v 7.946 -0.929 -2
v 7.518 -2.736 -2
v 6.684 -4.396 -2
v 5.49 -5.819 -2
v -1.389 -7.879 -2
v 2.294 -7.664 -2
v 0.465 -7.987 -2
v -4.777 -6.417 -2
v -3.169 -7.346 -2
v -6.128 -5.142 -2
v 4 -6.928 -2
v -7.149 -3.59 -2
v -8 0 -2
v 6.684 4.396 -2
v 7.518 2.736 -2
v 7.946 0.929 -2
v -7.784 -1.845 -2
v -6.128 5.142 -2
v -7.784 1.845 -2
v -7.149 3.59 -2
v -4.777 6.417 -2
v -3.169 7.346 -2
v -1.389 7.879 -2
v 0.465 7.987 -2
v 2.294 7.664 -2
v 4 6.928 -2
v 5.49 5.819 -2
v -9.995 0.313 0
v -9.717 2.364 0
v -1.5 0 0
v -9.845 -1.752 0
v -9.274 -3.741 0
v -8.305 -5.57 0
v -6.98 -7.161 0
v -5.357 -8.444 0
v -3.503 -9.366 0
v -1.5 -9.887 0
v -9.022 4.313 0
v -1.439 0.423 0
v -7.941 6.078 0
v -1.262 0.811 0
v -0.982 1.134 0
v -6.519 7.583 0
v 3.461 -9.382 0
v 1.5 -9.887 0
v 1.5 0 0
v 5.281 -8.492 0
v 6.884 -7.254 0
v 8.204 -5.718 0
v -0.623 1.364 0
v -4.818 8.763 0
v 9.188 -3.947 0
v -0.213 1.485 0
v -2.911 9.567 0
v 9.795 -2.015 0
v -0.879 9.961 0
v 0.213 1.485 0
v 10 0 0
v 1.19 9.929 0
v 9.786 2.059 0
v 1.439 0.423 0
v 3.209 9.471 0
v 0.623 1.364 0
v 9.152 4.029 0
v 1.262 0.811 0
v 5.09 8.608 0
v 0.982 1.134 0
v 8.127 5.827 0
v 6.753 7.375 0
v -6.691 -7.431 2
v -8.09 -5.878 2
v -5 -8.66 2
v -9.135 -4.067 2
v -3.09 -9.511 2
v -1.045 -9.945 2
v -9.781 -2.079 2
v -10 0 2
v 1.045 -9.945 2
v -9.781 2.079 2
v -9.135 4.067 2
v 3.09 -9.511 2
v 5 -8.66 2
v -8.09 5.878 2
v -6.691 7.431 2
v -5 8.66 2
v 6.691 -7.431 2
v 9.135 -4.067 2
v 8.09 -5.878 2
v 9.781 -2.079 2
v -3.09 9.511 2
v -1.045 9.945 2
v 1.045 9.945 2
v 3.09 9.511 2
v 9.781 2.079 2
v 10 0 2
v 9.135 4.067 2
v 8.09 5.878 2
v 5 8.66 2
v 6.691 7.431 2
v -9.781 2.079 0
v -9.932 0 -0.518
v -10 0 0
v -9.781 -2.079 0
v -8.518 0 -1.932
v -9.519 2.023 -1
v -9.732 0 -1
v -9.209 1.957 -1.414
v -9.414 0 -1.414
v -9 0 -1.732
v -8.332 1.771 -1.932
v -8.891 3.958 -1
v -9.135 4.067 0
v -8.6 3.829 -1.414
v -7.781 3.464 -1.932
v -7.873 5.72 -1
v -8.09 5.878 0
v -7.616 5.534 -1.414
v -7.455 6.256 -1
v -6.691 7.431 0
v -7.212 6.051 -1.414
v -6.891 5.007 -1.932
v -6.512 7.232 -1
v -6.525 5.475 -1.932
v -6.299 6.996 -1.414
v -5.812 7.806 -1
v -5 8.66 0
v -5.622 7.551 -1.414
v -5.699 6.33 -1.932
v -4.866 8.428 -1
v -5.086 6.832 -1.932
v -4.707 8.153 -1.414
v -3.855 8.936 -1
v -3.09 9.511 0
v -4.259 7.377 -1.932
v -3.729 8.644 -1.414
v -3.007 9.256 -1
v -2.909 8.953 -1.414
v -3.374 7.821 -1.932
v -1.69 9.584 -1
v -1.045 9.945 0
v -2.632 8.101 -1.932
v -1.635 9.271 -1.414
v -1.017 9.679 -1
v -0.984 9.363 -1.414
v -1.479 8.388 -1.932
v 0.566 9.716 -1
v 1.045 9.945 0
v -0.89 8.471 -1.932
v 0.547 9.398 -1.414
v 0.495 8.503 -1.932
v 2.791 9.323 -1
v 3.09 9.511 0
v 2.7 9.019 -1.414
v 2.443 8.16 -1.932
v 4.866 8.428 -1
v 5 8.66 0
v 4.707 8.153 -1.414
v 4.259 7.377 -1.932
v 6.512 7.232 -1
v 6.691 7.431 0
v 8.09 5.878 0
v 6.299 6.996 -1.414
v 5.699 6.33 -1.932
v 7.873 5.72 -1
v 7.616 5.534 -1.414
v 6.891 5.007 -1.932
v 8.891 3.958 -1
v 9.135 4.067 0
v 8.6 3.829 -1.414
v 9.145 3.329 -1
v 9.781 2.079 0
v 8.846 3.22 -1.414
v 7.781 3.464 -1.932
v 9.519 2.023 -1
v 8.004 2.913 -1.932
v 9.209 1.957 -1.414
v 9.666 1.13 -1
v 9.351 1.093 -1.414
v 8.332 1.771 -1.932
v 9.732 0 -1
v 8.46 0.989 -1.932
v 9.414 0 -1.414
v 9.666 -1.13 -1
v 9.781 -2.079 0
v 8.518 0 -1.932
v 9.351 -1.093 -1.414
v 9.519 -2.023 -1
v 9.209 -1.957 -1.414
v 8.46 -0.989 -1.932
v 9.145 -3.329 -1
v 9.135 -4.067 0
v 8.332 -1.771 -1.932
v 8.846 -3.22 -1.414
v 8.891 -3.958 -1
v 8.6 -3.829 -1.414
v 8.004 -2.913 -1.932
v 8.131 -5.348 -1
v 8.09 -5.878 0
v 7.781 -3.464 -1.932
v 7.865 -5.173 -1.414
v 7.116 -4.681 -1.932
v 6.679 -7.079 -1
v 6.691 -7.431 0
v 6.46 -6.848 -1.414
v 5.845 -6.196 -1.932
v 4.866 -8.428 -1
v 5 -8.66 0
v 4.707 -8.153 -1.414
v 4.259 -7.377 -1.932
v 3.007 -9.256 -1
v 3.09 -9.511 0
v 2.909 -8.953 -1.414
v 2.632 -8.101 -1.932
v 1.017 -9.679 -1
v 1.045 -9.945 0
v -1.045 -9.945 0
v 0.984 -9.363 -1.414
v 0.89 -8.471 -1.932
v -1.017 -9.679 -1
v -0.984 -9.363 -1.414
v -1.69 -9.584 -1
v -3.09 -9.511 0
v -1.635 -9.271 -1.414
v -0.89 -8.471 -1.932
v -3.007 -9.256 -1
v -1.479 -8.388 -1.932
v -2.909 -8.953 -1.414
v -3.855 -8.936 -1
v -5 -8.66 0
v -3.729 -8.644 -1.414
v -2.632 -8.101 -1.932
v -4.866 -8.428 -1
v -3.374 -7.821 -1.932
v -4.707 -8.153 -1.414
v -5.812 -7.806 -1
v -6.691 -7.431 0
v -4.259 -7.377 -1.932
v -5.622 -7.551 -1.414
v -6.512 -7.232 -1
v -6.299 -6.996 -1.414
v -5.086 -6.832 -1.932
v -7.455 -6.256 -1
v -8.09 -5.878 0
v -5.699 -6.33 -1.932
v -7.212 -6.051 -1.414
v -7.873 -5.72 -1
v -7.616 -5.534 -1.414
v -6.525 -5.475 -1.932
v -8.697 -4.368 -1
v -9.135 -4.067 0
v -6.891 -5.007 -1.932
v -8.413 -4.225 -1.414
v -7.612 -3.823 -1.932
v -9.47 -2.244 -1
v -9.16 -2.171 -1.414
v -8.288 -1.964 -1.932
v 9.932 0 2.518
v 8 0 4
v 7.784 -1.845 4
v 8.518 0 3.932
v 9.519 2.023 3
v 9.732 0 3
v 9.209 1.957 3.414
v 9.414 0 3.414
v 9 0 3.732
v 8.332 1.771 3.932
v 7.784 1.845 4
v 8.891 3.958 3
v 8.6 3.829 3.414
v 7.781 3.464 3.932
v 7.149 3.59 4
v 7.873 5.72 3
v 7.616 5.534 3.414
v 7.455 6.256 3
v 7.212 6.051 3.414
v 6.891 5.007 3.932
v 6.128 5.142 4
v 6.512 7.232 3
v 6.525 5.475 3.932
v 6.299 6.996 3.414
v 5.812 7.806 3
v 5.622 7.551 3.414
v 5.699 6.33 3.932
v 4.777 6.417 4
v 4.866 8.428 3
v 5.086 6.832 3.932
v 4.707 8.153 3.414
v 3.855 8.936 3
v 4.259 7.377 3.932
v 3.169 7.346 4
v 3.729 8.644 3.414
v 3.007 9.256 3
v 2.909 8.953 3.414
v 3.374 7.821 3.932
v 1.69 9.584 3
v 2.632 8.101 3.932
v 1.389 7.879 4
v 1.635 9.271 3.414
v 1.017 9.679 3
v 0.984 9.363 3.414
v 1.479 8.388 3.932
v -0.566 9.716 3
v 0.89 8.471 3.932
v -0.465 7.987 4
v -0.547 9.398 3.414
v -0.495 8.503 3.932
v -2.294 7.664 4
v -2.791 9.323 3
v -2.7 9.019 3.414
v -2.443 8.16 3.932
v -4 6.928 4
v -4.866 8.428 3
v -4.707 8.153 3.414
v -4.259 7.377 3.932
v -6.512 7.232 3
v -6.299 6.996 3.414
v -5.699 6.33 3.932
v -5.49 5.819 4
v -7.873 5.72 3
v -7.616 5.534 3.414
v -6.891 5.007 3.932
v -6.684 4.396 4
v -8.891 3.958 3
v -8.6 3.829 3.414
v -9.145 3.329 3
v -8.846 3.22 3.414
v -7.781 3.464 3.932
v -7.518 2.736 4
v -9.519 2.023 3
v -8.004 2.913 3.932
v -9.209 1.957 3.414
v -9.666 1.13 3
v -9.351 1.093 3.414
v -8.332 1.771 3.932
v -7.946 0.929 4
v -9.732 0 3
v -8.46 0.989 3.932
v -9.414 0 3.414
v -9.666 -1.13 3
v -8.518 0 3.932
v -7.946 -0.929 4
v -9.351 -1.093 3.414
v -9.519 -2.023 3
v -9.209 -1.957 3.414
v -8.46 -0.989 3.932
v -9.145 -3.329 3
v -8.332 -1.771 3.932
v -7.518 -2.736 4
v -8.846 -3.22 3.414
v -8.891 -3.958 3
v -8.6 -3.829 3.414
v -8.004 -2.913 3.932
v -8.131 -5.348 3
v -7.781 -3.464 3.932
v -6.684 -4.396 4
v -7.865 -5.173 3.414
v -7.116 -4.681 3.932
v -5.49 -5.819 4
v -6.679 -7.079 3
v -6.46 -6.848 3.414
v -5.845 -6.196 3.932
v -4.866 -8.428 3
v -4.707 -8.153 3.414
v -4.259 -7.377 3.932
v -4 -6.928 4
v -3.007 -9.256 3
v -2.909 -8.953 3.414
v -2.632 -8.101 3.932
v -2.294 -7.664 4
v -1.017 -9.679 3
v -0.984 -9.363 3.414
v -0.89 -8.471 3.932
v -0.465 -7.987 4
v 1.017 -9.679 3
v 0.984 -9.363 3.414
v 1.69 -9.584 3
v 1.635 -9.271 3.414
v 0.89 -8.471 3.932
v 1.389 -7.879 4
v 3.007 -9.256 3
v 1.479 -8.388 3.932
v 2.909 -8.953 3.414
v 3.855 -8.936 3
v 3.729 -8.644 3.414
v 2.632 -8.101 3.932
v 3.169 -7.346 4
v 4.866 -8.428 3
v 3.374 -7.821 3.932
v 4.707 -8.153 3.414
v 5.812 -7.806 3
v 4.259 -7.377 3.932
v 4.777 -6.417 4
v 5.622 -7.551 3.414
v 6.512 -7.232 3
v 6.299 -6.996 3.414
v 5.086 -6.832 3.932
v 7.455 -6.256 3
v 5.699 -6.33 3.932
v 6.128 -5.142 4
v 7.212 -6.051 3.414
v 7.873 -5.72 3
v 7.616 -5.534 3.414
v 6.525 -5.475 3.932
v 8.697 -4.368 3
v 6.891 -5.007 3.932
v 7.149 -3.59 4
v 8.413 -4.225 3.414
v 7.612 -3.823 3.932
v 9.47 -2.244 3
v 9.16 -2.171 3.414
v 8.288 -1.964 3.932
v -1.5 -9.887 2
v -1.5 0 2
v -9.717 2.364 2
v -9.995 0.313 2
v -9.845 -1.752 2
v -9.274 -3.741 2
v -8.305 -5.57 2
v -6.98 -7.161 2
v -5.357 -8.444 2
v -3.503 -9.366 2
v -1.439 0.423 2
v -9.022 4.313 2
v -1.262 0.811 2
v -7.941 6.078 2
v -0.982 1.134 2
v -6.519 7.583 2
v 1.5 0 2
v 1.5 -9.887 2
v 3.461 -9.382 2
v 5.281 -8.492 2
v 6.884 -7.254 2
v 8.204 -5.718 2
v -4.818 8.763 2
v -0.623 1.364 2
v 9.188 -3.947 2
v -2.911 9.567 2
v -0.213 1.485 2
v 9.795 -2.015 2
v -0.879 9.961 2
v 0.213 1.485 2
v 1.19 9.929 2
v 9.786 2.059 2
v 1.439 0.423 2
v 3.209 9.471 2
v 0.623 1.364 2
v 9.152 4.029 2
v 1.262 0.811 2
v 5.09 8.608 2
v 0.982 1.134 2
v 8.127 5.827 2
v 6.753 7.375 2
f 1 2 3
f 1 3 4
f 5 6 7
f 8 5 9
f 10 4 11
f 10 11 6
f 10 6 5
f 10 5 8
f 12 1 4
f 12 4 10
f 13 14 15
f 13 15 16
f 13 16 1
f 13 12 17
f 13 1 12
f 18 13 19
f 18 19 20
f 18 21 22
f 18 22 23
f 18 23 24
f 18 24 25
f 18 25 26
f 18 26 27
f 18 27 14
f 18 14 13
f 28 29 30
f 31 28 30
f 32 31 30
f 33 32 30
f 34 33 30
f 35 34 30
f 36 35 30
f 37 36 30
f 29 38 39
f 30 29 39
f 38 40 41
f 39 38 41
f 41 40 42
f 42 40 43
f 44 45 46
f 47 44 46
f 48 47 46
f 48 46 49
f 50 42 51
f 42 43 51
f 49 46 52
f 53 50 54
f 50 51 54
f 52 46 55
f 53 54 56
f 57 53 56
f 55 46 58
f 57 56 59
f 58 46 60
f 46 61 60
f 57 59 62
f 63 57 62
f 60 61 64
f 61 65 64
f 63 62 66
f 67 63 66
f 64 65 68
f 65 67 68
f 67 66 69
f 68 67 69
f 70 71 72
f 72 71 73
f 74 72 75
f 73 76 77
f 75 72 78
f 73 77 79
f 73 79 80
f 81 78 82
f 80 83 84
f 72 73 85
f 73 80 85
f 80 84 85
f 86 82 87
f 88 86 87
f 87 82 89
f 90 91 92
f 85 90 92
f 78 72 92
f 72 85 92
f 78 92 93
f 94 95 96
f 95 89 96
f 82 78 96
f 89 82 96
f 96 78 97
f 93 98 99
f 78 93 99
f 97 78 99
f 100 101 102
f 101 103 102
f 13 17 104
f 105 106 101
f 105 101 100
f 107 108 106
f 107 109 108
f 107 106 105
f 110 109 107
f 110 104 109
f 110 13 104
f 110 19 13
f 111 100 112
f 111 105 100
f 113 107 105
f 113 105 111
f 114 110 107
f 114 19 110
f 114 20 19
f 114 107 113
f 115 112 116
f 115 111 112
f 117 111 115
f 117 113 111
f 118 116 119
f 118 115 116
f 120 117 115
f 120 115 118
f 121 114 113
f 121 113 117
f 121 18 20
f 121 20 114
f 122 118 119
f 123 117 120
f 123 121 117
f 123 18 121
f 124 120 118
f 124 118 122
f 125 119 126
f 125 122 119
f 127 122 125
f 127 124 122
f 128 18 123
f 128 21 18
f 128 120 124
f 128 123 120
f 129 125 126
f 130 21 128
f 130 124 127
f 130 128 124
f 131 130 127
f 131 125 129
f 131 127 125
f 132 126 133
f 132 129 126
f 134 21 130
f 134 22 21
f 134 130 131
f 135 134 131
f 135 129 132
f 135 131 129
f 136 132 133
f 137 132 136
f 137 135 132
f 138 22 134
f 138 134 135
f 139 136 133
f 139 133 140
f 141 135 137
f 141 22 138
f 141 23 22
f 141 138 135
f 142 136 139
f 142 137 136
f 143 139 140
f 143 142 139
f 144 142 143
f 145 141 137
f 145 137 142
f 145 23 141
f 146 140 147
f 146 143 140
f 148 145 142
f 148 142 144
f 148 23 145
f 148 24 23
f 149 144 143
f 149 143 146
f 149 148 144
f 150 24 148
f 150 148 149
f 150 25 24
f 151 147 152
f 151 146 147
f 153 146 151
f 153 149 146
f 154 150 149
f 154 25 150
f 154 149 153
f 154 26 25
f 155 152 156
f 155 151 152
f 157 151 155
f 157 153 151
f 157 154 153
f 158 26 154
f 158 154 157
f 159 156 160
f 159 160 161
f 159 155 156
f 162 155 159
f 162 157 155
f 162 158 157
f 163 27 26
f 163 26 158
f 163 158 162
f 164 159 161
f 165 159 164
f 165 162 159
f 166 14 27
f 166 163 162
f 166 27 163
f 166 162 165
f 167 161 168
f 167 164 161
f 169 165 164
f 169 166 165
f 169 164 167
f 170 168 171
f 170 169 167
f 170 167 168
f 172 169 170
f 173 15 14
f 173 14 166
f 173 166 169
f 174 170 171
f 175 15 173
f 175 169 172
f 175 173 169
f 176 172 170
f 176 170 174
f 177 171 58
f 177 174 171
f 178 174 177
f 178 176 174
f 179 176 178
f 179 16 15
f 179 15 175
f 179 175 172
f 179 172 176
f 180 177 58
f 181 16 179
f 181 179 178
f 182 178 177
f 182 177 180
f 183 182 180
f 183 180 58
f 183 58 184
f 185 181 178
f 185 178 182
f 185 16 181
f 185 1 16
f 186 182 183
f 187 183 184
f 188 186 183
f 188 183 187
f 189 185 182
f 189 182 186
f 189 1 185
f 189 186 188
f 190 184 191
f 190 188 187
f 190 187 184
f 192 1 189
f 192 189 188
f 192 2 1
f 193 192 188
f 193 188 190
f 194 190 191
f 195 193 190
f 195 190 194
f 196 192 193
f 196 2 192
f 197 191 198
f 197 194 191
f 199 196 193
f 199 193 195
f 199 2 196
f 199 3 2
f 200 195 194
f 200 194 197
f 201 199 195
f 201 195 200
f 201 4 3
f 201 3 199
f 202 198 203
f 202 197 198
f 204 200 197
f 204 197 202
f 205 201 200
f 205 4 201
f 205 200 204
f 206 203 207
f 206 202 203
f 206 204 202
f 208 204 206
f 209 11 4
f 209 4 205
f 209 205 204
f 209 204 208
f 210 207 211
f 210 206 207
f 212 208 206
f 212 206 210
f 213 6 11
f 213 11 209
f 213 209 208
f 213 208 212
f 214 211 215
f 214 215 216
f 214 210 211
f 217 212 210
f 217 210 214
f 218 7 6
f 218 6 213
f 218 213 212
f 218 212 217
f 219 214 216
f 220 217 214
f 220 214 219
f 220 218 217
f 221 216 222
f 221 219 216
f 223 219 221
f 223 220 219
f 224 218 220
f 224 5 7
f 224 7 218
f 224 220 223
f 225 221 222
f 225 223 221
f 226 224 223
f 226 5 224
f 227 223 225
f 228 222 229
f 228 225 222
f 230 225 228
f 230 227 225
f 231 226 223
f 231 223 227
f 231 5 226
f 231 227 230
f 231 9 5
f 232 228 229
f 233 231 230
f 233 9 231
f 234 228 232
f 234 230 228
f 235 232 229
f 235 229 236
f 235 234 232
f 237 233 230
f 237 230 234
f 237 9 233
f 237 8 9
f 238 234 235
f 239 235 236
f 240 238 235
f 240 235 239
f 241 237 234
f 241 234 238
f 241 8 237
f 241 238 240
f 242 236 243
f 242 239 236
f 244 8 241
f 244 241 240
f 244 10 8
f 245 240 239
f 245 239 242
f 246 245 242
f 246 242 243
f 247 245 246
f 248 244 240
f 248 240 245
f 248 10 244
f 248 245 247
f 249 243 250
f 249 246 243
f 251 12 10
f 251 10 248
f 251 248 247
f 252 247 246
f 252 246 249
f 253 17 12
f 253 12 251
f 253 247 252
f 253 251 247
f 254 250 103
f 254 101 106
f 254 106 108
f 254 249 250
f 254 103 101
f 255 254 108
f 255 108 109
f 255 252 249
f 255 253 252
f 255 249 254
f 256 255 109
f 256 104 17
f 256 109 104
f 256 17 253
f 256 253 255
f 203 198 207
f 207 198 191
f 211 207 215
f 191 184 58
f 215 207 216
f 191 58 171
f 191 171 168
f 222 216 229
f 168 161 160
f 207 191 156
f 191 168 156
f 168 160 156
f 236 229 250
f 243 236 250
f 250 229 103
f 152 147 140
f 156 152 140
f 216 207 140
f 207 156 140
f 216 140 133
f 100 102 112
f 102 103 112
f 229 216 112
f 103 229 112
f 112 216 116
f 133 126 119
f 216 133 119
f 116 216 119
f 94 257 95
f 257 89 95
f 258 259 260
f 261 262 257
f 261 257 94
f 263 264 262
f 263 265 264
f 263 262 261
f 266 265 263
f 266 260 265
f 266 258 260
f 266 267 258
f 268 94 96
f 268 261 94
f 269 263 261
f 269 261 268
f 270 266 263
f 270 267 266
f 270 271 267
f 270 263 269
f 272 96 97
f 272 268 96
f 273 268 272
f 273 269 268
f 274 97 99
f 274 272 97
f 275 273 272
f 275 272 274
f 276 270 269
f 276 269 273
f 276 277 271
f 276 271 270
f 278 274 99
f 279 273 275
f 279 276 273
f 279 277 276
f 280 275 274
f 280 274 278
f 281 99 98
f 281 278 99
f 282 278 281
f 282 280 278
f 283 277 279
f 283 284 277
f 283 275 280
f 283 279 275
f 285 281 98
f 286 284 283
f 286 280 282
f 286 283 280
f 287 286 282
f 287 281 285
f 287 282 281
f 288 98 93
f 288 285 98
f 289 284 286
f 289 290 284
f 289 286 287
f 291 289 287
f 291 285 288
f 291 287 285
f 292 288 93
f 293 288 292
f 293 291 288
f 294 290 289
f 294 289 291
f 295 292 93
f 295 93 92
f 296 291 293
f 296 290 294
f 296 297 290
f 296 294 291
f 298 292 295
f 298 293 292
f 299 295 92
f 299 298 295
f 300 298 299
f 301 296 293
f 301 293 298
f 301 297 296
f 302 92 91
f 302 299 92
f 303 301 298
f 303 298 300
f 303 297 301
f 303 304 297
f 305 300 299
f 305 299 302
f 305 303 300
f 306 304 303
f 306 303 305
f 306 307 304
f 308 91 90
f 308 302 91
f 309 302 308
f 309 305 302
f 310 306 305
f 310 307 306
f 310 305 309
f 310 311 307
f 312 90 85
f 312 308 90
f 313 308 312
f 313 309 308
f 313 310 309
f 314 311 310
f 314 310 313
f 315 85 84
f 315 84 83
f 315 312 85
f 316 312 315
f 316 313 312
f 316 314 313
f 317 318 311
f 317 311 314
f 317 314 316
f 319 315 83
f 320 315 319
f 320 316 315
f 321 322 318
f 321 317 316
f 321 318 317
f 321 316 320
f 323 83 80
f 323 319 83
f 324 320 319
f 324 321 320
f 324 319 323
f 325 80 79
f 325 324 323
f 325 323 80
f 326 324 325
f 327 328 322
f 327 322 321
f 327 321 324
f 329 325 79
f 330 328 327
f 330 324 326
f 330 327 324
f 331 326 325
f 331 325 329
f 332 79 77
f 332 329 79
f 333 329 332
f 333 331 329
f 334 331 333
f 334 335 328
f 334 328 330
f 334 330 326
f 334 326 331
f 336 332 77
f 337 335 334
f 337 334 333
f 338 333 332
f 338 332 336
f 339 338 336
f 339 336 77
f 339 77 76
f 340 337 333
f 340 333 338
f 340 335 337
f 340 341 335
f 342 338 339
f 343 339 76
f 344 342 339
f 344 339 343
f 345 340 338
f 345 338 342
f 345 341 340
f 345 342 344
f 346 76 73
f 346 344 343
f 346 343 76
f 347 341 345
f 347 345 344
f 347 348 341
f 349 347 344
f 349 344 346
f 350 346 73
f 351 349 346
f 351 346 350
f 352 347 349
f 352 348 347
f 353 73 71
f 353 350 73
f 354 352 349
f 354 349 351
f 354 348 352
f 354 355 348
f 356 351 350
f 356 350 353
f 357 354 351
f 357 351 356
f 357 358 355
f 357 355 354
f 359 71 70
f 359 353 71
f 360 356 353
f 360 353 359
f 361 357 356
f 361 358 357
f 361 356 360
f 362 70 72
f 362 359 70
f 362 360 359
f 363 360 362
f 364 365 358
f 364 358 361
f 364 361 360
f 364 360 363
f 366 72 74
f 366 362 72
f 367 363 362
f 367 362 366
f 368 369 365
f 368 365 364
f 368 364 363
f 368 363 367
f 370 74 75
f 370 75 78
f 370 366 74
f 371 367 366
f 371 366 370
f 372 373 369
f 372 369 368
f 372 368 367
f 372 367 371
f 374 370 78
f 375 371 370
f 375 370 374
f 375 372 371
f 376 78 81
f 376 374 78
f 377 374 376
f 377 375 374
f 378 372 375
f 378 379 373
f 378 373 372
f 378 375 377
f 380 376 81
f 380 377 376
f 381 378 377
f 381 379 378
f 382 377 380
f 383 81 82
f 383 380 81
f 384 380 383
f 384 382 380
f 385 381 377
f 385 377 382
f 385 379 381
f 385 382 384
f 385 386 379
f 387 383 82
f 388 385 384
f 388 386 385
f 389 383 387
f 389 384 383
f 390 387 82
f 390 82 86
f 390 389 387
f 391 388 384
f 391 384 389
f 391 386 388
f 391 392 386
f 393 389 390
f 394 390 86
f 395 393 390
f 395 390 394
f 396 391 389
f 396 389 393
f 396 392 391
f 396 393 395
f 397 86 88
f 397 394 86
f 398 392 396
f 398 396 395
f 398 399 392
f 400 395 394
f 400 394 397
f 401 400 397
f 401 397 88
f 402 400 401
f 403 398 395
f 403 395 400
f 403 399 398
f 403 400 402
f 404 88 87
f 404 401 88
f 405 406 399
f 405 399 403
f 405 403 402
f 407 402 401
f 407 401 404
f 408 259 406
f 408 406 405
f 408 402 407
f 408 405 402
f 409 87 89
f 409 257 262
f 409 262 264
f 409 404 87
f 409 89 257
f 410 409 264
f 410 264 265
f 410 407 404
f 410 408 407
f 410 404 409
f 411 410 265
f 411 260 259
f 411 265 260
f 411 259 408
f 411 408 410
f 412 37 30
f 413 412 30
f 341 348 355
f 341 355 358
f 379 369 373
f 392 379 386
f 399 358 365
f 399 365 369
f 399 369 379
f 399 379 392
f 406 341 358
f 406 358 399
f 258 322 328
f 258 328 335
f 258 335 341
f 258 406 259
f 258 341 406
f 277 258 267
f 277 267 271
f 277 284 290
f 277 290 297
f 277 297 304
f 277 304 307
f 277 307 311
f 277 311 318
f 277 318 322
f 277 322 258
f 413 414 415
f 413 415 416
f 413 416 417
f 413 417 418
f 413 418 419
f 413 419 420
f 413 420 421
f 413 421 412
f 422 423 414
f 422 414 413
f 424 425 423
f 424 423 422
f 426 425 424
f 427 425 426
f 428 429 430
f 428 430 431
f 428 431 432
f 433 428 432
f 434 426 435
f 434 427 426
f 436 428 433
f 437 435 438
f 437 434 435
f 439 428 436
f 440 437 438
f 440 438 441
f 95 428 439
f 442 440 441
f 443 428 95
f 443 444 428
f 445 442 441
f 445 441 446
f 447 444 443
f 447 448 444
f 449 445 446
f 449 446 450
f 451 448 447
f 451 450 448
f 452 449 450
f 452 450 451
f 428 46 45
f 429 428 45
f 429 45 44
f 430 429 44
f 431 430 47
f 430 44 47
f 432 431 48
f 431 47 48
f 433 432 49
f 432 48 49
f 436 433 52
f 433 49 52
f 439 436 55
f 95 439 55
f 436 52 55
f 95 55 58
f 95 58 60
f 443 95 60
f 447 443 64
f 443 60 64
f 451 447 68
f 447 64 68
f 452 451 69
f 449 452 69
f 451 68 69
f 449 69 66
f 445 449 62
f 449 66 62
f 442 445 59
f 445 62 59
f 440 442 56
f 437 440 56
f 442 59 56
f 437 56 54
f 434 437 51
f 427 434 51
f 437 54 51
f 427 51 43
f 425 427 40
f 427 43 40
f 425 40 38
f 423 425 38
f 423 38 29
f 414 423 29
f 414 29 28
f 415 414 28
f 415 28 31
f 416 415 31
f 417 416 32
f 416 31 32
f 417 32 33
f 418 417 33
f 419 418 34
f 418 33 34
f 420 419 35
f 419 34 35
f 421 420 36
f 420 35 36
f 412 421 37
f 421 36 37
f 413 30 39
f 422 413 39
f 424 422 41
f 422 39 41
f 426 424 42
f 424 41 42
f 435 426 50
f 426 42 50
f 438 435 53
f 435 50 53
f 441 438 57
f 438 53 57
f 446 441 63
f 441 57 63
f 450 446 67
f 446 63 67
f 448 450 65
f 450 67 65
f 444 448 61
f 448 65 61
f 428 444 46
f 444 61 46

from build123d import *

# Parameters (mm, degrees)
BOSS_EXTRUDE1_DEPTH = 2
SKETCH2_R           = 10
BOSS_EXTRUDE2_DEPTH = 2
SKETCH3_R           = 10
BOSS_EXTRUDE3_DEPTH = 2
FILLET2_R           = 2
FILLET3_R           = 2


with BuildPart() as part:
    # Sketch1 → Boss-Extrude1 (new body)
    with BuildSketch(Plane.XY):
        with BuildLine():
            ThreePointArc((10, 0), (-6.519202405, 7.582875444), (-1.5, -9.886859967))
            Line((-1.5, -9.886859967), (-1.5, 0))
            ThreePointArc((-1.5, 0), (0, 1.5), (1.5, 0))
            Line((1.5, 0), (1.5, -9.886859967))
            ThreePointArc((1.5, -9.886859967), (7.582875444, -6.519202405), (10, 0))
        make_face()
    extrude(amount=BOSS_EXTRUDE1_DEPTH)


with BuildPart() as body_2:
    # Sketch2 → Boss-Extrude2 (new body)
    with BuildSketch(Plane.XY.offset(2)):
        Circle(SKETCH2_R)
    extrude(amount=BOSS_EXTRUDE2_DEPTH)

    # Fillet3
    fillet3_edges = [body_2.edges().sort_by_distance(p)[0] for p in [
        (-10, 0, 4),
    ]]
    fillet(fillet3_edges, radius=FILLET3_R - 0.0001)  # a hair under: the kernel refuses the full size


with BuildPart() as body_3:
    # Sketch3 → Boss-Extrude3 (new body)
    with BuildSketch(Plane(origin=(0, 0, 0), x_dir=(-1, 0, 0), z_dir=(0, 0, -1))):
        Circle(SKETCH3_R)
    extrude(amount=BOSS_EXTRUDE3_DEPTH)

    # Fillet2
    fillet2_edges = [body_3.edges().sort_by_distance(p)[0] for p in [
        (10, 0, -2),
    ]]
    fillet(fillet2_edges, radius=FILLET2_R - 0.0001)  # a hair under: the kernel refuses the full size


solid = Compound([part.part, body_2.part, body_3.part])
